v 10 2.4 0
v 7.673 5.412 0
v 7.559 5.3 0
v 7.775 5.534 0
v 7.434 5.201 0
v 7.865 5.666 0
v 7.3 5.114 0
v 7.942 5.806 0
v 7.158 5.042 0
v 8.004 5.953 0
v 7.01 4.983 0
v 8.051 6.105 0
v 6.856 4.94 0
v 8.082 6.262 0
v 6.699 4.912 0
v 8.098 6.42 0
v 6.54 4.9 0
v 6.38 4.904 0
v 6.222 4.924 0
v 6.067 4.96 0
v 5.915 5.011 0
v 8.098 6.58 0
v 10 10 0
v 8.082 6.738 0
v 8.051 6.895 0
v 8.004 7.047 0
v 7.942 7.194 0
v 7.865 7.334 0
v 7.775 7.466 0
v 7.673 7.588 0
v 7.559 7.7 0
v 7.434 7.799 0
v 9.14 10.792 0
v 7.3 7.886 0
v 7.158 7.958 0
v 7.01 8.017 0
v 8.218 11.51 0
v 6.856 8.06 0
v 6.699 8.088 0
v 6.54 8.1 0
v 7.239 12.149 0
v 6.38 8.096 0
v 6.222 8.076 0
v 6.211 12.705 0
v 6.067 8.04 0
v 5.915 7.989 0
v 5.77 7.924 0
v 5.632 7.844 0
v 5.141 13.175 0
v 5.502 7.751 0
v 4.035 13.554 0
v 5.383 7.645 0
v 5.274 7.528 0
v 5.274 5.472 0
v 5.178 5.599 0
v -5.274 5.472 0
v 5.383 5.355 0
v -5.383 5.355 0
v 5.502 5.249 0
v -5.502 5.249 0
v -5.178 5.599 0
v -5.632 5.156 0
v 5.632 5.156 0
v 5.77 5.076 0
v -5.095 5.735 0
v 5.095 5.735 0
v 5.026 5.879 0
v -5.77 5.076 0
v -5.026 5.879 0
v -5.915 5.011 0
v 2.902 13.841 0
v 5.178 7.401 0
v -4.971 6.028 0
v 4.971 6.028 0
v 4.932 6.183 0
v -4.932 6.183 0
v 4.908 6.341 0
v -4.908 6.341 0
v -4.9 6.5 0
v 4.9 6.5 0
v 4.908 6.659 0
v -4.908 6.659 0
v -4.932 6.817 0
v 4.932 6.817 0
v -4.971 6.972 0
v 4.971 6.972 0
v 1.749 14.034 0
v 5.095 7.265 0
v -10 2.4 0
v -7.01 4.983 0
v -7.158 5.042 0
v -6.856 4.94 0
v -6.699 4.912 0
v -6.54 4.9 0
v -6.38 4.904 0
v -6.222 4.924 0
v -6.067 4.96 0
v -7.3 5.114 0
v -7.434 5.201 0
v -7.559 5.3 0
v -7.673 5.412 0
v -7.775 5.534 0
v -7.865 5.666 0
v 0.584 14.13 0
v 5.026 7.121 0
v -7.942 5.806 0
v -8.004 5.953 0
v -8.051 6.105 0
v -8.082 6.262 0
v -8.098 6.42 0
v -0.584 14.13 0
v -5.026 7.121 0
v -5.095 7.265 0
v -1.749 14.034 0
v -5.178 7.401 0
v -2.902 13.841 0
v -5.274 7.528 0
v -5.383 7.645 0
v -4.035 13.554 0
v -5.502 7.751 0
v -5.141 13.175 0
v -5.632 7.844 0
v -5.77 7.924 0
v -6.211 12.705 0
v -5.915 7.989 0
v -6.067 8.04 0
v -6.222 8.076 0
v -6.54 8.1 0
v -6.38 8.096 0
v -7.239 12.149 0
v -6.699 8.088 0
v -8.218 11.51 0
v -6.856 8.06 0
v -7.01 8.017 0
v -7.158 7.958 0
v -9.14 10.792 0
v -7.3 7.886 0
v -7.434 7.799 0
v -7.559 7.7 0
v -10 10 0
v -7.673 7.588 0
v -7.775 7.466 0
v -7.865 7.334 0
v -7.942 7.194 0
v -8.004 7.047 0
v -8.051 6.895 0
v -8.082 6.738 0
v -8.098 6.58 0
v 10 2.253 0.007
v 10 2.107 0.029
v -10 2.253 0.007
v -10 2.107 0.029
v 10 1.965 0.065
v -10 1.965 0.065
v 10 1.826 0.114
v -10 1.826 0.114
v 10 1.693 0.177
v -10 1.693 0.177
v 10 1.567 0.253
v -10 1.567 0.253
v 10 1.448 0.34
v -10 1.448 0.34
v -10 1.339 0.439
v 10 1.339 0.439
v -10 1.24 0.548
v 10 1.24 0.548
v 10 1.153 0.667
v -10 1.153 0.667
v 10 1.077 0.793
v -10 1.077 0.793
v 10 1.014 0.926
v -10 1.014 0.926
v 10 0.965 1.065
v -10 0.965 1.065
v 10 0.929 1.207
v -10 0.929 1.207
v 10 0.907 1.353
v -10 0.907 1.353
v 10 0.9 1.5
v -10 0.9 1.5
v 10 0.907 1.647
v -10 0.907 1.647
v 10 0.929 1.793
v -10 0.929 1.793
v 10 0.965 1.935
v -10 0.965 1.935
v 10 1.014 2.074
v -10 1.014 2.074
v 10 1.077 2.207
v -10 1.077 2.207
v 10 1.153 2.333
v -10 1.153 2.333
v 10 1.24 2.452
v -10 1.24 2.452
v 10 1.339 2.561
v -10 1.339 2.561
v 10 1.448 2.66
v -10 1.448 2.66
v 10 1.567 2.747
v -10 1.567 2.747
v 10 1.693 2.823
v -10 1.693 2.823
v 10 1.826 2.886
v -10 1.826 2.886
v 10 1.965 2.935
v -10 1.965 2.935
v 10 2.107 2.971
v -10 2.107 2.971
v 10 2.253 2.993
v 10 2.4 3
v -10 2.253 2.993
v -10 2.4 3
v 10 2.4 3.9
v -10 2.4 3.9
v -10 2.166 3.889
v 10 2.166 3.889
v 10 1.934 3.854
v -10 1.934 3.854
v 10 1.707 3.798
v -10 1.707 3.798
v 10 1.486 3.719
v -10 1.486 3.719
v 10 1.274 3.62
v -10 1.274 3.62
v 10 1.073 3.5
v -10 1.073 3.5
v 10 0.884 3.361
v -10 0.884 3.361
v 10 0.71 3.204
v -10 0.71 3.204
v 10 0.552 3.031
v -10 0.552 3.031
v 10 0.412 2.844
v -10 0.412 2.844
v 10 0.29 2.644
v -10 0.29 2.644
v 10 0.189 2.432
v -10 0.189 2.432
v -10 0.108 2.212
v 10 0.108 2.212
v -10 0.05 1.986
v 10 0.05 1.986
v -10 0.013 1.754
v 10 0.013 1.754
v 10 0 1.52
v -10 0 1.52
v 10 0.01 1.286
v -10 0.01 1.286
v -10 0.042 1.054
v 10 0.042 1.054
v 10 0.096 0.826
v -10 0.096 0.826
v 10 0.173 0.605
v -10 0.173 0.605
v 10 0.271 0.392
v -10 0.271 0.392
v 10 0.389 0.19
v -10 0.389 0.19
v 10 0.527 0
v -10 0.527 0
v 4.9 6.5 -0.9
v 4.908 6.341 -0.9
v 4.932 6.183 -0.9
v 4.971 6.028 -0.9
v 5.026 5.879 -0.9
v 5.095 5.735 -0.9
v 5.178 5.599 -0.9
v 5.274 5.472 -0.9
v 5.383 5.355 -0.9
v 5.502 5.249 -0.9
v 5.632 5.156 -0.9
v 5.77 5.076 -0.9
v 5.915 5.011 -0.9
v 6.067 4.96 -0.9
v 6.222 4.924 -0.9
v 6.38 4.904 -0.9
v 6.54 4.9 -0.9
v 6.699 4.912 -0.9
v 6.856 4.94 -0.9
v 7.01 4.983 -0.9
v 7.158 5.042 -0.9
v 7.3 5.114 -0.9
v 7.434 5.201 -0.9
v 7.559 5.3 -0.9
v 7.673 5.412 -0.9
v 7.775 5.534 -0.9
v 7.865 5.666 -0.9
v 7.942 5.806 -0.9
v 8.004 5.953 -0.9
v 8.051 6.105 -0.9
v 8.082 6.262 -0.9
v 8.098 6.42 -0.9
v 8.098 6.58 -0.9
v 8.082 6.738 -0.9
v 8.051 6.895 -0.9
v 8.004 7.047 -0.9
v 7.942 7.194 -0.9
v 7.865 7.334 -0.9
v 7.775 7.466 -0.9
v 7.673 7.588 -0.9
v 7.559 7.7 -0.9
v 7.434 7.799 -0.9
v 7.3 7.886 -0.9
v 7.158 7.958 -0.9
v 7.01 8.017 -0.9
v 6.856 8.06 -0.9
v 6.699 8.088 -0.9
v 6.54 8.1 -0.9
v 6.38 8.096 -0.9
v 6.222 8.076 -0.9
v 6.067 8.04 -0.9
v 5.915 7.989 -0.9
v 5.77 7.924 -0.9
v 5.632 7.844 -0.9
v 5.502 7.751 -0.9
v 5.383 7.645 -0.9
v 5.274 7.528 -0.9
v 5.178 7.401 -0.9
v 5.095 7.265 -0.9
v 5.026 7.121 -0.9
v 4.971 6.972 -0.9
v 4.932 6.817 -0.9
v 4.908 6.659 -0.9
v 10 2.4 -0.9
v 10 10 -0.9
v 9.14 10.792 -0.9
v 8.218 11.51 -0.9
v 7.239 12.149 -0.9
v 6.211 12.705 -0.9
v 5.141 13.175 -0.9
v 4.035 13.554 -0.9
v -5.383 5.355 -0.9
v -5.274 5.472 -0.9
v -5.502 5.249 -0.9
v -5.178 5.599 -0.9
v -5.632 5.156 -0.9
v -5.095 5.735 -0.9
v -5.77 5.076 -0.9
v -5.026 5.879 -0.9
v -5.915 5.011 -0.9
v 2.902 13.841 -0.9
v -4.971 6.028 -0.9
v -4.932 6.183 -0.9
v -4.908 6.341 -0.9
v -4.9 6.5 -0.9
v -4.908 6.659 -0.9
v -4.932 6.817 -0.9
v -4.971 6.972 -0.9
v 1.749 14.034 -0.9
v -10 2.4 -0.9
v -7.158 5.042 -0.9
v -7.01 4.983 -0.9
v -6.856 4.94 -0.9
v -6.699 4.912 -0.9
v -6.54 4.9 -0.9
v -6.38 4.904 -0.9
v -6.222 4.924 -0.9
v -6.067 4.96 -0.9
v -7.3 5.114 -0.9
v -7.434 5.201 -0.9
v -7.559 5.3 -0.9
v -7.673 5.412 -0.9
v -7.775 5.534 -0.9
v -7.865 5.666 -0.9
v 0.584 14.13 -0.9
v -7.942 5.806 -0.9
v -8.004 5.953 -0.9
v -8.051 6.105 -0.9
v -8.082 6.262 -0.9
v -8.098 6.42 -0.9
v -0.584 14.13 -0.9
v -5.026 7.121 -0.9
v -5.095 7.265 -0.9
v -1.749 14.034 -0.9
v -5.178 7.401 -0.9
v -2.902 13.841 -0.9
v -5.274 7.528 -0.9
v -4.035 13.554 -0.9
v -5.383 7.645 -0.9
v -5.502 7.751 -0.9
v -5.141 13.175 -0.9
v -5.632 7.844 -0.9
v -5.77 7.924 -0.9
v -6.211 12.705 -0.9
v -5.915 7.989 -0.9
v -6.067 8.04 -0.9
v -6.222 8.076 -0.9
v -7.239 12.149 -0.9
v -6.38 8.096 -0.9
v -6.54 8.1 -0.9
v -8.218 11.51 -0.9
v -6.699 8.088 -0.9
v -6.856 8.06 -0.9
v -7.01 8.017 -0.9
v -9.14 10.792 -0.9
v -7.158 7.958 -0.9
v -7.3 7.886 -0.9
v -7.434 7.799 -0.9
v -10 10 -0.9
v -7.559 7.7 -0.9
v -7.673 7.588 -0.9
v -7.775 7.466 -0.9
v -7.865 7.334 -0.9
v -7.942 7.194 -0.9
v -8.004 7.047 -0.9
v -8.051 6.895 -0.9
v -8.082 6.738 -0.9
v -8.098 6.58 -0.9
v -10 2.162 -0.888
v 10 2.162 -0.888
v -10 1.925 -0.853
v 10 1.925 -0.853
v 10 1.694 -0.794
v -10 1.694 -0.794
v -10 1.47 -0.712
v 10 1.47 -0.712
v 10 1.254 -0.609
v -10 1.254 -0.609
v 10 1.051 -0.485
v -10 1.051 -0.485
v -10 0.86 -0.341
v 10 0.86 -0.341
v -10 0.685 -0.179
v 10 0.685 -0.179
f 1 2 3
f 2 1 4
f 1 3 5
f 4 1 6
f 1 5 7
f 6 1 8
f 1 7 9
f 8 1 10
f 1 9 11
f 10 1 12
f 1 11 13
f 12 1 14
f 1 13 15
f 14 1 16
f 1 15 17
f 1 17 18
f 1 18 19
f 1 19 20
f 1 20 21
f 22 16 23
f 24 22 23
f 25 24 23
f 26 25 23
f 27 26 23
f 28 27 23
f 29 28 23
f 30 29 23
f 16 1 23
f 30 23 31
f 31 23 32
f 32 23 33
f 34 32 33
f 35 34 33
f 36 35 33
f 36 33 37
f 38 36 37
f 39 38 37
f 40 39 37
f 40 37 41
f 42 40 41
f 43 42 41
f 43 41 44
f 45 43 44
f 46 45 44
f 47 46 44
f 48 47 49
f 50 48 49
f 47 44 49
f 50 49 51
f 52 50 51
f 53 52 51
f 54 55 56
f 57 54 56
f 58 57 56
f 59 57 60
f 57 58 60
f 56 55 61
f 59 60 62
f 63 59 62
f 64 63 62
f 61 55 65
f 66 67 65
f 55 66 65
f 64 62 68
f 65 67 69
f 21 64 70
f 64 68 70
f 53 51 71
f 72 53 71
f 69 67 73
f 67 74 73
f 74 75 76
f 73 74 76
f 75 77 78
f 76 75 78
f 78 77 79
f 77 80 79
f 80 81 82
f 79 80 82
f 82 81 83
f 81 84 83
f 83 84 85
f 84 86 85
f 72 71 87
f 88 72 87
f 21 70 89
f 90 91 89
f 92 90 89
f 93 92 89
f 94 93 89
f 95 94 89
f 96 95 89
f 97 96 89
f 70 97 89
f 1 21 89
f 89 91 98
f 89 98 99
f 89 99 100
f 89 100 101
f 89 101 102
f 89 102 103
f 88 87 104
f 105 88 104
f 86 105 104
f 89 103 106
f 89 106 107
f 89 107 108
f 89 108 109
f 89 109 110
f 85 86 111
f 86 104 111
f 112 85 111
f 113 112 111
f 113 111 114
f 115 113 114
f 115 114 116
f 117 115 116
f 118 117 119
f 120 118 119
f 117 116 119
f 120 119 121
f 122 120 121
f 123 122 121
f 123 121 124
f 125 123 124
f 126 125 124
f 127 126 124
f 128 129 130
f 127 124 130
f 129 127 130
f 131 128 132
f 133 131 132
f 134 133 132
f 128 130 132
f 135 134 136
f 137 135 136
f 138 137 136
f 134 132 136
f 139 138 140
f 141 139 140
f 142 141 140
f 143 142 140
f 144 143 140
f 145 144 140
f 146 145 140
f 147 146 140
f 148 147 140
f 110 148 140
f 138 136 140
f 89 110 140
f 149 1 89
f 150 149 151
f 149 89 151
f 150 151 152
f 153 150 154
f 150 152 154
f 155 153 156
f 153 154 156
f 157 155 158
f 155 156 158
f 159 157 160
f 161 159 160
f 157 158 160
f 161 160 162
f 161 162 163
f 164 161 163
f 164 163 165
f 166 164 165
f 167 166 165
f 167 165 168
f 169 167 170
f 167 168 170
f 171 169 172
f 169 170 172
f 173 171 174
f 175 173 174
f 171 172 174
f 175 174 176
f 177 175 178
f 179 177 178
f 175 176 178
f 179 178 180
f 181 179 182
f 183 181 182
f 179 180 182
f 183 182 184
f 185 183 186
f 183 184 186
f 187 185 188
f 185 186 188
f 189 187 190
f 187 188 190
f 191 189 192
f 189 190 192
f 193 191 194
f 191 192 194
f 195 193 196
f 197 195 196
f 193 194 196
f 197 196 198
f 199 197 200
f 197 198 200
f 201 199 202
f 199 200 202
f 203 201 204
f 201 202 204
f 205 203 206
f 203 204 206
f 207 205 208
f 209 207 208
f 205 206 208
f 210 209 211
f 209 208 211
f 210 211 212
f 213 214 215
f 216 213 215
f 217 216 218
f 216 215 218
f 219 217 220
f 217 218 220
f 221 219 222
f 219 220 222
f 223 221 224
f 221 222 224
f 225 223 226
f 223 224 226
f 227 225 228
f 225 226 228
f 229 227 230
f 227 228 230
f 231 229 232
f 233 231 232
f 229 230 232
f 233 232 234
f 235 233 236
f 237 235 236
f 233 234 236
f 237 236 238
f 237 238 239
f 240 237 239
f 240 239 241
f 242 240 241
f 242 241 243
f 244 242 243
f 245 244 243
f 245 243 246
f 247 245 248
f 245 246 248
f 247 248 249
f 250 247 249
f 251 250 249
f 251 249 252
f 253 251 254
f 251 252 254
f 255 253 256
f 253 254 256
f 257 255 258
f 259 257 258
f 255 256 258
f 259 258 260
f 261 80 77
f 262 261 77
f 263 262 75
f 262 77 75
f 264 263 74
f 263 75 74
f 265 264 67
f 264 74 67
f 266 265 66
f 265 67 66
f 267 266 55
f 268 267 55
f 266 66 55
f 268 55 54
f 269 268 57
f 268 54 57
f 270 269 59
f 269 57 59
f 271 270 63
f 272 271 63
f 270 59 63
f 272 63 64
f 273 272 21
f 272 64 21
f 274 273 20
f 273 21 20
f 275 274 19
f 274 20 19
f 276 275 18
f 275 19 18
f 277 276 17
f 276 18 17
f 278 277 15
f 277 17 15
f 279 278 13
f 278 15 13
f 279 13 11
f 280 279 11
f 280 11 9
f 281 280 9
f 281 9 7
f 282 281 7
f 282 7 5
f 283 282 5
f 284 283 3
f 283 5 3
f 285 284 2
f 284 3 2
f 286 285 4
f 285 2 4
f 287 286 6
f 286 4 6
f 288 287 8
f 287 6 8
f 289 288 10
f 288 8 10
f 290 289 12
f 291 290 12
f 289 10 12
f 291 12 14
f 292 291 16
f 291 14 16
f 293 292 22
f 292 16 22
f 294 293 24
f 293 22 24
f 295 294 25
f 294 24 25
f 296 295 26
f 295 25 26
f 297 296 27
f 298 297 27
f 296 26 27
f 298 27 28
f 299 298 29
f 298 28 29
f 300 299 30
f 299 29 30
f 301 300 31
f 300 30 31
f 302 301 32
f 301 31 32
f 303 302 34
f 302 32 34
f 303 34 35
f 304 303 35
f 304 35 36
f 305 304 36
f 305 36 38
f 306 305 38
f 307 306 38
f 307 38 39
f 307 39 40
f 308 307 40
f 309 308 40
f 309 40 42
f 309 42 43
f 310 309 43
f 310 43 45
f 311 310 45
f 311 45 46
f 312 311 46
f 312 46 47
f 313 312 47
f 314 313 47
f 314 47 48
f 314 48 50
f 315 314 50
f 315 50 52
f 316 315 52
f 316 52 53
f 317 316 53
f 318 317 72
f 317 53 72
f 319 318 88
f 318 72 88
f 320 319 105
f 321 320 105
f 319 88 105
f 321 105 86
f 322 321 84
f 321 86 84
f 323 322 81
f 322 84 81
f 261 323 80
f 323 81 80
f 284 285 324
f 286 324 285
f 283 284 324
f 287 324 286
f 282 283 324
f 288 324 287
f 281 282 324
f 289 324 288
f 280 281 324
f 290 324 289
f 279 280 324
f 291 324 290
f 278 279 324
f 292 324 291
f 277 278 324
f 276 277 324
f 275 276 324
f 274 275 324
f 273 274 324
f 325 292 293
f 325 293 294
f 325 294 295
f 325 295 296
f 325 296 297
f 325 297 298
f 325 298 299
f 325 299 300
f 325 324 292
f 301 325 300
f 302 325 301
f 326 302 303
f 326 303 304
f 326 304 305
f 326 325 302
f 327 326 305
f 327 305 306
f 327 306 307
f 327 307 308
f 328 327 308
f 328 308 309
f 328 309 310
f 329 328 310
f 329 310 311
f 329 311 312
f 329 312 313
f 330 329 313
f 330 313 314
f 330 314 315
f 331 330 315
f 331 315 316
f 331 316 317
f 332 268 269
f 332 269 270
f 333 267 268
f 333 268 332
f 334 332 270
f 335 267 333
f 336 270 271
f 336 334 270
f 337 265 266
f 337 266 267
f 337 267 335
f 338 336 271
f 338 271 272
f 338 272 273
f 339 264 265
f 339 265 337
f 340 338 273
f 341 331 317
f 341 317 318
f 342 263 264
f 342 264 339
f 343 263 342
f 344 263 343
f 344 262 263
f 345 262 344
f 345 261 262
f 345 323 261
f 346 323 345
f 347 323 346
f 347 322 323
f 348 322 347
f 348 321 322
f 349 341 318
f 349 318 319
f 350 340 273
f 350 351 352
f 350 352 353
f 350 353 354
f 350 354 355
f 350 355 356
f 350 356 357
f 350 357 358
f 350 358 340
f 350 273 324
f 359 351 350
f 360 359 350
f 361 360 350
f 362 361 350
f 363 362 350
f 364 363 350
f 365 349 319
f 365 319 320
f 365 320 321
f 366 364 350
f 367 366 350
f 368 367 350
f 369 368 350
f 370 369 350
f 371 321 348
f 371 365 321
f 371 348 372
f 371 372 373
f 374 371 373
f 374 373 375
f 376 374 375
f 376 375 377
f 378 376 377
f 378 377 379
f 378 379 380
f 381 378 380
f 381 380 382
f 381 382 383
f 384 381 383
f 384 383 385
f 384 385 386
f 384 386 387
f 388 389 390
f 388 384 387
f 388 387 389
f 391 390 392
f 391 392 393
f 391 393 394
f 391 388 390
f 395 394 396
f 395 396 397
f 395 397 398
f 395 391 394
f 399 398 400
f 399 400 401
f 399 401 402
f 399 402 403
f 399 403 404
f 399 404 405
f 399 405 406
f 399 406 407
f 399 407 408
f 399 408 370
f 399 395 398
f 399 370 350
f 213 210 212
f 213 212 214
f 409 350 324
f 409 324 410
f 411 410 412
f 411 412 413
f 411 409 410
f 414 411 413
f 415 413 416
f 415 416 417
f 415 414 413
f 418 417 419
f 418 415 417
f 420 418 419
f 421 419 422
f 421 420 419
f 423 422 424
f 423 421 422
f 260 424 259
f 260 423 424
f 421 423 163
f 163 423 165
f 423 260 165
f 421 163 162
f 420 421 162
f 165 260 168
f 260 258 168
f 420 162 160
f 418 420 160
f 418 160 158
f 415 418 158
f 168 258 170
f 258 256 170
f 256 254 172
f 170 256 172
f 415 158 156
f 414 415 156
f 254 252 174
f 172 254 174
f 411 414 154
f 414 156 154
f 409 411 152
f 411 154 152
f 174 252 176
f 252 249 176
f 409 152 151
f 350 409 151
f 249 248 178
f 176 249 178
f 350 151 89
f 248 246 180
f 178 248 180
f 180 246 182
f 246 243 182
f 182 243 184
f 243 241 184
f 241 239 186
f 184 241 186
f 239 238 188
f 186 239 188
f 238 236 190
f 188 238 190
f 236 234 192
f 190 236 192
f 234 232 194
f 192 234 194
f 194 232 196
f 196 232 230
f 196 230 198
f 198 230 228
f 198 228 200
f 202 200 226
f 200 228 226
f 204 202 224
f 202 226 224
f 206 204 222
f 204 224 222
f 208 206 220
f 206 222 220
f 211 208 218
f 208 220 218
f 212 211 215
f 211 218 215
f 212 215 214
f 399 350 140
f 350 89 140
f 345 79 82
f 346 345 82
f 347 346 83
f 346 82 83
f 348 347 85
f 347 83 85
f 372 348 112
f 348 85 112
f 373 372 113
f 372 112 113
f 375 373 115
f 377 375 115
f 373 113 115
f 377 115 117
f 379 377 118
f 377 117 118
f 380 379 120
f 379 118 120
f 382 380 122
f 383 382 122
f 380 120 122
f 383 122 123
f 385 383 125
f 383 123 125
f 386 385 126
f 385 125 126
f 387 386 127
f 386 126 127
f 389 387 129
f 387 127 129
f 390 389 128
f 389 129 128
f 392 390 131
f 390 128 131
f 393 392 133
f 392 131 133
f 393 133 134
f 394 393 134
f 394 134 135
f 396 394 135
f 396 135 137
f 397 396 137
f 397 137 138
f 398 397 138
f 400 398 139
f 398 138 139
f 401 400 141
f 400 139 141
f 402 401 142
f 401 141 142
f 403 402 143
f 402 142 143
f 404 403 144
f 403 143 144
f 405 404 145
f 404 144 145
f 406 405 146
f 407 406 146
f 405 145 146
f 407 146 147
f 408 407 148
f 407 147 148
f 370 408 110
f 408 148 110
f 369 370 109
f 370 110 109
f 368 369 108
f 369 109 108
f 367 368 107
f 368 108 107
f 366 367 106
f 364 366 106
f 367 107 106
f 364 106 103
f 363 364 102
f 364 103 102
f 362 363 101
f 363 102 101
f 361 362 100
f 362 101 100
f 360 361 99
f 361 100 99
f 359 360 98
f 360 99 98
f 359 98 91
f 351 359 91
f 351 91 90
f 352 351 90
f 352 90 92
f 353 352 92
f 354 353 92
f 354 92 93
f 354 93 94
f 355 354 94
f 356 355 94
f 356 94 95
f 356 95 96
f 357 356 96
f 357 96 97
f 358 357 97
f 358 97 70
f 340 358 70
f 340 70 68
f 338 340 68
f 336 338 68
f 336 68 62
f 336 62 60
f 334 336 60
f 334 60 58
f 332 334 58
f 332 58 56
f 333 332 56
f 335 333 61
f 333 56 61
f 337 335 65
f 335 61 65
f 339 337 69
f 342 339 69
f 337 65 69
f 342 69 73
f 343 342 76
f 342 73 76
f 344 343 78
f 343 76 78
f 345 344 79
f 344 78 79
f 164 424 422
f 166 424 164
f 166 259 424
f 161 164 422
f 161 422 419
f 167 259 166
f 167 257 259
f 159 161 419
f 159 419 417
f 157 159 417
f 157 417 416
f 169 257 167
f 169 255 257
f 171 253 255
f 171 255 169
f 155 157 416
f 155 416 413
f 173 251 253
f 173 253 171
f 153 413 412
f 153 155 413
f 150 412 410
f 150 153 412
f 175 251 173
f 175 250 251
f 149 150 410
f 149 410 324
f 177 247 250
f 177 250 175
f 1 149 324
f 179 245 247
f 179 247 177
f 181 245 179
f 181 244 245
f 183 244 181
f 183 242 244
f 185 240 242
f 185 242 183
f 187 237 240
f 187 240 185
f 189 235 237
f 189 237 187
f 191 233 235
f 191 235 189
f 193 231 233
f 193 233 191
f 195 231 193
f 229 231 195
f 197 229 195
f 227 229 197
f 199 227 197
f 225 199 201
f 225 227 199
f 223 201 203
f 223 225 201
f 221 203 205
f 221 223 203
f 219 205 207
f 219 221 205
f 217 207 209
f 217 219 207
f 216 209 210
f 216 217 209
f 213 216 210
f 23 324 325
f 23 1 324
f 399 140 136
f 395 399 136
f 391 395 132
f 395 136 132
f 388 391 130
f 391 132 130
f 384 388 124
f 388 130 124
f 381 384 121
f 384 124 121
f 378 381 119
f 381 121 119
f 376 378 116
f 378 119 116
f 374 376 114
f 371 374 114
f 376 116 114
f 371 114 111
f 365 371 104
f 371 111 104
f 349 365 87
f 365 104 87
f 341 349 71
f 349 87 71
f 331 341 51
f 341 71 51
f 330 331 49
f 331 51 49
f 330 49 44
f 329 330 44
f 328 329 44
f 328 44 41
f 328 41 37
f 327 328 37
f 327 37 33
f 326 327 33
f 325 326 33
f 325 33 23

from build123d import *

# Parameters (mm, degrees)
SKETCH_1_R             = 1.6
SM_BASE_FLANGE_1_DEPTH = 0.9
OTHER_START            = -10
OTHER_1_DEPTH          = 20
OTHER_1_2_DEPTH        = 20


# Read off the part's stored shape, not the designer's step: 褶边1
# Sheet-metal steps are written as plain solids
with BuildPart() as part:
    # Sketch 1 → 基体-法兰1 (new body)
    with BuildSketch(Plane.XY):
        with BuildLine():
            Line((10, 0), (-10, 0))
            Line((-10, 0), (-10, 10))
            ThreePointArc((-10, 10), (0, 14.142135624), (10, 10))
            Line((10, 10), (10, 0))
        make_face()
        with Locations((-6.5, 6.5)):
            Circle(SKETCH_1_R, mode=Mode.SUBTRACT)
        with Locations(Location((6.5, 6.5, 0), (0, 0, 180))):
            Circle(SKETCH_1_R, mode=Mode.SUBTRACT)
    extrude(amount=-SM_BASE_FLANGE_1_DEPTH)

    # Other 1 outline → Other 1 (cut)
    with BuildSketch(Plane.YZ.offset(OTHER_START)):
        with BuildLine():
            ThreePointArc((2.4, -0.9), (1.360769515, -0.663330765), (0.5265006, 0))
            Line((0.5265006, 0), (0, 0))
            Line((0, 0), (0, -0.9))
            Line((0, -0.9), (2.4, -0.9))
        make_face()
    extrude(amount=OTHER_1_DEPTH, mode=Mode.SUBTRACT)

    # Other 1 2 outline → Other 1 2 (add)
    with BuildSketch(Plane.YZ.offset(OTHER_START)):
        with BuildLine():
            Line((2.4, 3), (2.4, 3.9))
            ThreePointArc((2.4, 3.9), (0.236669235, 2.539230485), (0.5265006, 0))
            Line((0.5265006, 0), (2.4, 0))
            ThreePointArc((2.4, 0), (0.9, 1.5), (2.4, 3))
        make_face()
    extrude(amount=OTHER_1_2_DEPTH)


solid = part.part
